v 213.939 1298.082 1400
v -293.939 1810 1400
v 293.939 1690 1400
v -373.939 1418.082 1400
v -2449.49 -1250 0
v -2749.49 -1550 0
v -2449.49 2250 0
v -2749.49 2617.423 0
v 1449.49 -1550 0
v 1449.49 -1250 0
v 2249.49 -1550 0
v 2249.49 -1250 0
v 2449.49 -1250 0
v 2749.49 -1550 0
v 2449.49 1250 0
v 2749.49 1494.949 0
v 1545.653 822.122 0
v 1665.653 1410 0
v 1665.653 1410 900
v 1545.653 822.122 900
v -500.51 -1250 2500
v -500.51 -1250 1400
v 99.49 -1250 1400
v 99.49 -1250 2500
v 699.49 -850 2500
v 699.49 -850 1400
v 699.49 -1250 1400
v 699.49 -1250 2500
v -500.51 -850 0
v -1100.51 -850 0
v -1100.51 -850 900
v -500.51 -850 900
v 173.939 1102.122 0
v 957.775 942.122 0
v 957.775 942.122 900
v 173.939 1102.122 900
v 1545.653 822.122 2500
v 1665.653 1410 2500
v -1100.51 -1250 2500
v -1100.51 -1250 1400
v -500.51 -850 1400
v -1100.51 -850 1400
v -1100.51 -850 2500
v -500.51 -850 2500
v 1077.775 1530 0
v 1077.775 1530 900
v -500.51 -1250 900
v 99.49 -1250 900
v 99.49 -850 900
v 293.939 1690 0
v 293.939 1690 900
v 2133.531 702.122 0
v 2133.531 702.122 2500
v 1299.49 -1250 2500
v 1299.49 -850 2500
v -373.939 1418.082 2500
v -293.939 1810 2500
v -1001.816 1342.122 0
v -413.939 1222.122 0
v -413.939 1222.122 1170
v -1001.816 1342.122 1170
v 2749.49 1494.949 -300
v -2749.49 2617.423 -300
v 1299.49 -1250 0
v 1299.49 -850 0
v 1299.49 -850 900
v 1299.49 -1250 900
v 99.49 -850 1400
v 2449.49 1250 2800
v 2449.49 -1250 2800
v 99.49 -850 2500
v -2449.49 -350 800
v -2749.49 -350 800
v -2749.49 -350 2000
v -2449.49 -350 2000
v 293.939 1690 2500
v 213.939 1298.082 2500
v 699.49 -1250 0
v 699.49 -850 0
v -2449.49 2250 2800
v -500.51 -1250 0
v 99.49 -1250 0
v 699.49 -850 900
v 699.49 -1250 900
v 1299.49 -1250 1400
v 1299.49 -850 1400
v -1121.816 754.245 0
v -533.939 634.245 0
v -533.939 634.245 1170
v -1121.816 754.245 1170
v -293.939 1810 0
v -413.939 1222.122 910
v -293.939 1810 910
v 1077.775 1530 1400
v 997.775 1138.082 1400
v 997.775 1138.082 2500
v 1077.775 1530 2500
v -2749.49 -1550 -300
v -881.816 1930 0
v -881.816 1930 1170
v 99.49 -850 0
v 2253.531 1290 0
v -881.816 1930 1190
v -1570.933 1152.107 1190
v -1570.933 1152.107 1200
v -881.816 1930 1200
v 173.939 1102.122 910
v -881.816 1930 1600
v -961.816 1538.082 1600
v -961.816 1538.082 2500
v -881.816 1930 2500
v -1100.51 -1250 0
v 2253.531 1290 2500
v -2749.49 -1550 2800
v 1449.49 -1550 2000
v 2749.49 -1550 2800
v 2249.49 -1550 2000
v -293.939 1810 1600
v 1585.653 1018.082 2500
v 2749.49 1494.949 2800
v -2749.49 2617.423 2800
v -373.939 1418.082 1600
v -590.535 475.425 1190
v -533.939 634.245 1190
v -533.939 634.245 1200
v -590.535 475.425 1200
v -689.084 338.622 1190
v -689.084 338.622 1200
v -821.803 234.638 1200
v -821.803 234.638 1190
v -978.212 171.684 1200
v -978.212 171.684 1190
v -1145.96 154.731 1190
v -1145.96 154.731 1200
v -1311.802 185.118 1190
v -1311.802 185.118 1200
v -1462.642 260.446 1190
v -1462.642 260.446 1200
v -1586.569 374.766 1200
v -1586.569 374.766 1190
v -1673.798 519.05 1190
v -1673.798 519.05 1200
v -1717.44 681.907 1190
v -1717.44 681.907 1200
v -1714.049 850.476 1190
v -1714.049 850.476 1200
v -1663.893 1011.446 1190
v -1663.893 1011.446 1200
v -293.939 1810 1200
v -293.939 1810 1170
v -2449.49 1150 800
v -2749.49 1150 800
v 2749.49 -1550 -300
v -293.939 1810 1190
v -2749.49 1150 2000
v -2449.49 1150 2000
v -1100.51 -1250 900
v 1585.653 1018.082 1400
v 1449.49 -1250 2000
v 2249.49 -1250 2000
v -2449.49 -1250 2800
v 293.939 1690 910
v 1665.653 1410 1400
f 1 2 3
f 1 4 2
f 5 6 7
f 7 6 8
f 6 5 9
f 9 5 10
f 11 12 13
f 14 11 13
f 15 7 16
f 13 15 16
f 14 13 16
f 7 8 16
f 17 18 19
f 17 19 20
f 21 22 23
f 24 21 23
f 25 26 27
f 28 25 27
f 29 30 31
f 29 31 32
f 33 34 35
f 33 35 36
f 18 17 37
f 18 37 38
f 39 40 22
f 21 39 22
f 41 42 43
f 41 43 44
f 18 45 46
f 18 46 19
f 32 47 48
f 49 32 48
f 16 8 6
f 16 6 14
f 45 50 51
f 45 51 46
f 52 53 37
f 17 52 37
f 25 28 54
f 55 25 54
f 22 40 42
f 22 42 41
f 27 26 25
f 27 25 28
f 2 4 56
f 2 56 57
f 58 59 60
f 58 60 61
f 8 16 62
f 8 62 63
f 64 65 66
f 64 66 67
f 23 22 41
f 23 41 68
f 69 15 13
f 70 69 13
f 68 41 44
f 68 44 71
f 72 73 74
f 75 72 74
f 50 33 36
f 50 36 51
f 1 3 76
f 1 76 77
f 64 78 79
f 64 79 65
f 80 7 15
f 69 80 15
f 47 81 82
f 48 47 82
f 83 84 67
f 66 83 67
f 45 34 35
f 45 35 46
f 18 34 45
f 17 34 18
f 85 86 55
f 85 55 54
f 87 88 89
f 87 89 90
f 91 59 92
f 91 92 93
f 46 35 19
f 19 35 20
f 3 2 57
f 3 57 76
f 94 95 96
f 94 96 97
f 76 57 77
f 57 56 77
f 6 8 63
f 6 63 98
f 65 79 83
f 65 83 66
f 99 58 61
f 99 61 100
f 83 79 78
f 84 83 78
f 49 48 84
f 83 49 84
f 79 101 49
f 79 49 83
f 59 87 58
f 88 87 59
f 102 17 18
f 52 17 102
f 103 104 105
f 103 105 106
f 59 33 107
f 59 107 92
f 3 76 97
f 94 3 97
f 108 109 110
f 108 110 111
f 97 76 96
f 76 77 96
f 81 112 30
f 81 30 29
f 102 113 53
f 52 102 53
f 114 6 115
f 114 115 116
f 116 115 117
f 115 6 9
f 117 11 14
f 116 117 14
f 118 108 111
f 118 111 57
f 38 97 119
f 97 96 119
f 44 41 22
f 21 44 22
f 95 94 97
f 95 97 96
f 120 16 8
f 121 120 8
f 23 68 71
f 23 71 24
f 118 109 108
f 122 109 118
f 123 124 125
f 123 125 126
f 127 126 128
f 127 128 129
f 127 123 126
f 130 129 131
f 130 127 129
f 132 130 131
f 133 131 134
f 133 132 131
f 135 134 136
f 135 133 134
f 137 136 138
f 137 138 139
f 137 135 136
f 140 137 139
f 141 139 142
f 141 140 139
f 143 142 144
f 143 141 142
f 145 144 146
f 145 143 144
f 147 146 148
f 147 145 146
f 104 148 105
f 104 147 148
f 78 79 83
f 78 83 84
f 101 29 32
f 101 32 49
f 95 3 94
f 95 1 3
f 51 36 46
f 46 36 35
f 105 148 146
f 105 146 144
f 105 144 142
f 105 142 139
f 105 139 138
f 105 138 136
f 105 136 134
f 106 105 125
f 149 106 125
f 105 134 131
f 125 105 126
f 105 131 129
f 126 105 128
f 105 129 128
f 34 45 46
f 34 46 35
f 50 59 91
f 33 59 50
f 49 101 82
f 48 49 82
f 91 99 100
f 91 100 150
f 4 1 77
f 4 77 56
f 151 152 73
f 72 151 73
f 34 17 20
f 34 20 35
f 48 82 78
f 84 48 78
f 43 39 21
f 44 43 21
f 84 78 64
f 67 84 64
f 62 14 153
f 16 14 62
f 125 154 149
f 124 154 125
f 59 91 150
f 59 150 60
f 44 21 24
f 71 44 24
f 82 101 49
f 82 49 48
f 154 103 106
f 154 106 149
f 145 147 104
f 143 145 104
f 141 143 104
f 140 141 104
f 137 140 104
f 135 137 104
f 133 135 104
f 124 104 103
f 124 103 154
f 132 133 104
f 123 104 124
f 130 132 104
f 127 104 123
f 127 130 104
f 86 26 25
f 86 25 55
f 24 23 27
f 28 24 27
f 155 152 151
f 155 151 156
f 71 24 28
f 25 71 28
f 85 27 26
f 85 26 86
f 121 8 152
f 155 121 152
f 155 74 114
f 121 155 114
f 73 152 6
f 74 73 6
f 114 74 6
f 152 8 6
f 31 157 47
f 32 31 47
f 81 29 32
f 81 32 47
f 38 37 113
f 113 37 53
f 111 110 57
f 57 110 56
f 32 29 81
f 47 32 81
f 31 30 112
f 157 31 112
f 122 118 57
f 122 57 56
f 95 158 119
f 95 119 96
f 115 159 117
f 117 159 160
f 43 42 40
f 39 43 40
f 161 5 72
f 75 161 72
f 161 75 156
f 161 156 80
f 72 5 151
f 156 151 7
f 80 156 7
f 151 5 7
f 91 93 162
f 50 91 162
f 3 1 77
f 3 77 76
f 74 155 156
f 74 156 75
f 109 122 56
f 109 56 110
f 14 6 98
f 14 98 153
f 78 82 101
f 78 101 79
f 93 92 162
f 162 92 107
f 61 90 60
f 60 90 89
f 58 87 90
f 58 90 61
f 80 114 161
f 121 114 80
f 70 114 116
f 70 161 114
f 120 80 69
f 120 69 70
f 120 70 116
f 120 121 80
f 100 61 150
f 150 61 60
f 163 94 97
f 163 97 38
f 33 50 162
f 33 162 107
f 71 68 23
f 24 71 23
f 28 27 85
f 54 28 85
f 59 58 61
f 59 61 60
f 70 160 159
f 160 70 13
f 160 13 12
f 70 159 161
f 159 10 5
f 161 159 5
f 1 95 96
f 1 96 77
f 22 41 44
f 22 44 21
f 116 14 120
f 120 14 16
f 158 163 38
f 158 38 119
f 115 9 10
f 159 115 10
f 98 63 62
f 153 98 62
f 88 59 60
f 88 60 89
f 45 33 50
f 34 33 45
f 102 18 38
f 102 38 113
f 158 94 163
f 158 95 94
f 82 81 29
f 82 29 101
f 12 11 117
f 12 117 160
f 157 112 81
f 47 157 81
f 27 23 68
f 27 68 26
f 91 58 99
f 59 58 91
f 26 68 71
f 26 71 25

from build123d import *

# Parameters (mm, degrees)
F0_W      = 300
F0_H      = 1500
F0_W_2    = 800
F0_H_2    = 300
F1_DEPTH  = 300
F2_DEPTH  = 2800
F3_DEPTH  = 2000
F4_W      = 1500
F4_H      = 1200
F5_DEPTH  = 300
F7_DEPTH  = 2500
F8_DEPTH  = 1170
F6_W      = 600
F6_H      = 400
F9_DEPTH  = 900
F10_DEPTH = 900
F11_DEPTH = 900
F12_DEPTH = 900
F13_START = -1400
F13_DEPTH = 1100
F14_START = -1400
F14_DEPTH = 1100
F15_START = -1400
F15_DEPTH = 1100
F16_START = -1400
F16_DEPTH = 1100
F17_DEPTH = 900
F18_DEPTH = 900
F19_DEPTH = 910
F20_DEPTH = 1170
F21_START = -1190
F21_DEPTH = 10
F22_START = -1400
F22_DEPTH = 1100
F23_START = -1400
F23_DEPTH = 1100
F24_START = -1400
F24_DEPTH = 1100
F25_START = -1600
F25_DEPTH = 900


with BuildPart() as f1:
    # F0 (on Top) → F1 (new body)
    with BuildSketch(Plane.XY):
        with Locations((-2599.4897427832, 500)):
            Rectangle(F0_W, F0_H)
        Polygon((-2449.4897427832, -250), (-2449.4897427832, -1250), (1449.4897427832, -1250), (2249.4897427832, -1250), (2449.4897427832, -1250), (2449.4897427832, 1250), (-2449.4897427832, 2250), (-2449.4897427832, 1250), align=None)
        Polygon((2449.4897427832, -1250), (2249.4897427832, -1250), (2249.4897427832, -1550), (2749.4897427832, -1550), (2749.4897427832, 1494.9489742783), (-2749.4897427832, 2617.4234614175), (-2749.4897427832, 1250), (-2449.4897427832, 1250), (-2449.4897427832, 2250), (2449.4897427832, 1250), align=None)
        with Locations((1849.4897427832, -1400)):
            Rectangle(F0_W_2, F0_H_2)
        Polygon((1449.4897427832, -1250), (-2449.4897427832, -1250), (-2449.4897427832, -250), (-2749.4897427832, -250), (-2749.4897427832, -1550), (1449.4897427832, -1550), align=None)
    extrude(amount=-F1_DEPTH)


with BuildPart() as f2:
    # F0 (on Top) → F2 (new body)
    with BuildSketch(Plane.XY):
        Polygon((1449.4897427832, -1250), (-2449.4897427832, -1250), (-2449.4897427832, -250), (-2749.4897427832, -250), (-2749.4897427832, -1550), (1449.4897427832, -1550), align=None)
        with Locations((-2599.4897427832, 500)):
            Rectangle(F0_W, F0_H)
        Polygon((2449.4897427832, -1250), (2249.4897427832, -1250), (2249.4897427832, -1550), (2749.4897427832, -1550), (2749.4897427832, 1494.9489742783), (-2749.4897427832, 2617.4234614175), (-2749.4897427832, 1250), (-2449.4897427832, 1250), (-2449.4897427832, 2250), (2449.4897427832, 1250), align=None)
        with Locations((1849.4897427832, -1400)):
            Rectangle(F0_W_2, F0_H_2)
    extrude(amount=F2_DEPTH)

    # F0 (on Top) → F3 (cut)
    with BuildSketch(Plane.XY):
        with Locations((1849.4897427832, -1400)):
            Rectangle(F0_W_2, F0_H_2)
    extrude(amount=F3_DEPTH, mode=Mode.SUBTRACT)

    # F4 (on face) → F5 (cut, through all)
    with BuildSketch(Plane(origin=(-2749.4897427832, 0, 0), x_dir=(0, -1, 0), z_dir=(-1, 0, 0))):
        with Locations((-400, 1400)):
            Rectangle(F4_W, F4_H)
    extrude(amount=-F5_DEPTH, mode=Mode.SUBTRACT)


with BuildPart() as f7:
    # F6 (on face) → F7 (new body)
    with BuildSketch(Plane(origin=(0, 0, 0), x_dir=(1, 0, 0), z_dir=(0, 0, -1))):
        Polygon((1665.6530250926, -1410), (2253.5305633605, -1290), (2173.5305633605, -898.0816411547), (1585.6530250926, -1018.0816411547), align=None)
        Polygon((1585.6530250926, -1018.0816411547), (2173.5305633605, -898.0816411547), (2133.5305633605, -702.122461732), (1545.6530250926, -822.122461732), align=None)
    extrude(amount=-F7_DEPTH)


with BuildPart() as f8:
    # F6 (on face) → F8 (new body)
    with BuildSketch(Plane(origin=(0, 0, 0), x_dir=(1, 0, 0), z_dir=(0, 0, -1))):
        with BuildLine():
            Line((-1121.8163074019, -754.2449234641), (-1001.8163074019, -1342.122461732))
            ThreePointArc((-1001.8163074019, -1342.122461732), (-657.0583058571, -1133.7182426843), (-521.8163074019, -754.2449234641))
            ThreePointArc((-521.8163074019, -754.2449234641), (-524.8546155989, -693.939546261), (-533.938769134, -634.2449234641))
            Line((-533.938769134, -634.2449234641), (-1121.8163074019, -754.2449234641))
        make_face()
        with BuildLine():
            Line((-1001.8163074019, -1342.122461732), (-413.938769134, -1222.122461732))
            Line((-413.938769134, -1222.122461732), (-533.938769134, -634.2449234641))
            ThreePointArc((-533.938769134, -634.2449234641), (-524.8546155989, -693.939546261), (-521.8163074019, -754.2449234641))
            ThreePointArc((-521.8163074019, -754.2449234641), (-657.0583058571, -1133.7182426843), (-1001.8163074019, -1342.122461732))
        make_face()
    extrude(amount=-F8_DEPTH)


with BuildPart() as f9:
    # F6 (on face) → F9 (new body)
    with BuildSketch(Plane(origin=(0, 0, 0), x_dir=(1, 0, 0), z_dir=(0, 0, -1))):
        with Locations((999.4897427832, 1050)):
            Rectangle(F6_W, F6_H)
    extrude(amount=-F9_DEPTH)


with BuildPart() as f10:
    # F6 (on face) → F10 (new body)
    with BuildSketch(Plane(origin=(0, 0, 0), x_dir=(1, 0, 0), z_dir=(0, 0, -1))):
        with Locations((399.4897427832, 1050)):
            Rectangle(F6_W, F6_H)
    extrude(amount=-F10_DEPTH)


with BuildPart() as f11:
    # F6 (on face) → F11 (new body)
    with BuildSketch(Plane(origin=(0, 0, 0), x_dir=(1, 0, 0), z_dir=(0, 0, -1))):
        with Locations((-200.5102572168, 1050)):
            Rectangle(F6_W, F6_H)
    extrude(amount=-F11_DEPTH)


with BuildPart() as f12:
    # F6 (on face) → F12 (new body)
    with BuildSketch(Plane(origin=(0, 0, 0), x_dir=(1, 0, 0), z_dir=(0, 0, -1))):
        with Locations((-800.5102572168, 1050)):
            Rectangle(F6_W, F6_H)
    extrude(amount=-F12_DEPTH)


with BuildPart() as f13:
    # F6 (on face) → F13 (new body)
    with BuildSketch(Plane(origin=(0, 0, 0), x_dir=(1, 0, 0), z_dir=(0, 0, -1)).offset(F13_START)):
        with Locations((999.4897427832, 1050)):
            Rectangle(F6_W, F6_H)
    extrude(amount=-F13_DEPTH)


with BuildPart() as f14:
    # F6 (on face) → F14 (new body)
    with BuildSketch(Plane(origin=(0, 0, 0), x_dir=(1, 0, 0), z_dir=(0, 0, -1)).offset(F14_START)):
        with Locations((399.4897427832, 1050)):
            Rectangle(F6_W, F6_H)
    extrude(amount=-F14_DEPTH)


with BuildPart() as f15:
    # F6 (on face) → F15 (new body)
    with BuildSketch(Plane(origin=(0, 0, 0), x_dir=(1, 0, 0), z_dir=(0, 0, -1)).offset(F15_START)):
        with Locations((-200.5102572168, 1050)):
            Rectangle(F6_W, F6_H)
    extrude(amount=-F15_DEPTH)


with BuildPart() as f16:
    # F6 (on face) → F16 (new body)
    with BuildSketch(Plane(origin=(0, 0, 0), x_dir=(1, 0, 0), z_dir=(0, 0, -1)).offset(F16_START)):
        with Locations((-800.5102572168, 1050)):
            Rectangle(F6_W, F6_H)
    extrude(amount=-F16_DEPTH)


with BuildPart() as f17:
    # F6 (on face) → F17 (new body)
    with BuildSketch(Plane(origin=(0, 0, 0), x_dir=(1, 0, 0), z_dir=(0, 0, -1))):
        Polygon((997.7754868246, -1138.0816411547), (1585.6530250926, -1018.0816411547), (1545.6530250926, -822.122461732), (957.7754868246, -942.122461732), align=None)
        Polygon((1077.7754868246, -1530), (1665.6530250926, -1410), (1585.6530250926, -1018.0816411547), (997.7754868246, -1138.0816411547), align=None)
    extrude(amount=-F17_DEPTH)


with BuildPart() as f18:
    # F6 (on face) → F18 (new body)
    with BuildSketch(Plane(origin=(0, 0, 0), x_dir=(1, 0, 0), z_dir=(0, 0, -1))):
        Polygon((293.938769134, -1690), (1077.7754868246, -1530), (997.7754868246, -1138.0816411547), (213.938769134, -1298.0816411547), align=None)
        Polygon((213.938769134, -1298.0816411547), (997.7754868246, -1138.0816411547), (957.7754868246, -942.122461732), (173.938769134, -1102.122461732), align=None)
    extrude(amount=-F18_DEPTH)


with BuildPart() as f19:
    # F6 (on face) → F19 (new body)
    with BuildSketch(Plane(origin=(0, 0, 0), x_dir=(1, 0, 0), z_dir=(0, 0, -1))):
        Polygon((-293.938769134, -1810), (293.938769134, -1690), (213.938769134, -1298.0816411547), (-373.938769134, -1418.0816411547), align=None)
        Polygon((-373.938769134, -1418.0816411547), (213.938769134, -1298.0816411547), (173.938769134, -1102.122461732), (-413.938769134, -1222.122461732), align=None)
    extrude(amount=-F19_DEPTH)


with BuildPart() as f20:
    # F6 (on face) → F20 (new body, through all)
    with BuildSketch(Plane(origin=(0, 0, 0), x_dir=(1, 0, 0), z_dir=(0, 0, -1))):
        Polygon((-881.8163074019, -1930), (-293.938769134, -1810), (-373.938769134, -1418.0816411547), (-961.8163074019, -1538.0816411547), align=None)
        Polygon((-961.8163074019, -1538.0816411547), (-373.938769134, -1418.0816411547), (-413.938769134, -1222.122461732), (-1001.8163074019, -1342.122461732), align=None)
    extrude(amount=-F20_DEPTH)


with BuildPart() as f21:
    # F6 (on face) → F21 (new body)
    with BuildSketch(Plane(origin=(0, 0, 0), x_dir=(1, 0, 0), z_dir=(0, 0, -1)).offset(F21_START)):
        with BuildLine():
            ThreePointArc((-1570.9331898563, -1152.1067410522), (-1311.8320280818, -1323.3618059184), (-1001.8163074019, -1342.122461732))
            Line((-1001.8163074019, -1342.122461732), (-1121.8163074019, -754.2449234641))
            Line((-1121.8163074019, -754.2449234641), (-533.938769134, -634.2449234641))
            ThreePointArc((-533.938769134, -634.2449234641), (-1389.8813096484, -217.4571119681), (-1570.9331898563, -1152.1067410522))
        make_face()
        with BuildLine():
            Line((-1121.8163074019, -754.2449234641), (-1001.8163074019, -1342.122461732))
            ThreePointArc((-1001.8163074019, -1342.122461732), (-657.0583058571, -1133.7182426843), (-521.8163074019, -754.2449234641))
            ThreePointArc((-521.8163074019, -754.2449234641), (-524.8546155989, -693.939546261), (-533.938769134, -634.2449234641))
            Line((-533.938769134, -634.2449234641), (-1121.8163074019, -754.2449234641))
        make_face()
        with BuildLine():
            Line((-1001.8163074019, -1342.122461732), (-413.938769134, -1222.122461732))
            Line((-413.938769134, -1222.122461732), (-533.938769134, -634.2449234641))
            ThreePointArc((-533.938769134, -634.2449234641), (-524.8546155989, -693.939546261), (-521.8163074019, -754.2449234641))
            ThreePointArc((-521.8163074019, -754.2449234641), (-657.0583058571, -1133.7182426843), (-1001.8163074019, -1342.122461732))
        make_face()
        Polygon((-961.8163074019, -1538.0816411547), (-373.938769134, -1418.0816411547), (-413.938769134, -1222.122461732), (-1001.8163074019, -1342.122461732), align=None)
        Polygon((-881.8163074019, -1930), (-293.938769134, -1810), (-373.938769134, -1418.0816411547), (-961.8163074019, -1538.0816411547), align=None)
        with BuildLine():
            Line((-1188.0904773816, -1584.2696626899), (-961.8163074019, -1538.0816411547))
            Line((-961.8163074019, -1538.0816411547), (-1001.8163074019, -1342.122461732))
            ThreePointArc((-1001.8163074019, -1342.122461732), (-1311.8320280818, -1323.3618059184), (-1570.9331898563, -1152.1067410522))
            Line((-1570.9331898563, -1152.1067410522), (-1188.0904773816, -1584.2696626899))
        make_face()
        Polygon((-1188.0904773816, -1584.2696626899), (-881.8163074019, -1930), (-961.8163074019, -1538.0816411547), align=None)
    extrude(amount=-F21_DEPTH)


with BuildPart() as f22:
    # F6 (on face) → F22 (new body)
    with BuildSketch(Plane(origin=(0, 0, 0), x_dir=(1, 0, 0), z_dir=(0, 0, -1)).offset(F22_START)):
        Polygon((1077.7754868246, -1530), (1665.6530250926, -1410), (1585.6530250926, -1018.0816411547), (997.7754868246, -1138.0816411547), align=None)
    extrude(amount=-F22_DEPTH)


with BuildPart() as f23:
    # F6 (on face) → F23 (new body)
    with BuildSketch(Plane(origin=(0, 0, 0), x_dir=(1, 0, 0), z_dir=(0, 0, -1)).offset(F23_START)):
        Polygon((293.938769134, -1690), (1077.7754868246, -1530), (997.7754868246, -1138.0816411547), (213.938769134, -1298.0816411547), align=None)
    extrude(amount=-F23_DEPTH)


with BuildPart() as f24:
    # F6 (on face) → F24 (new body)
    with BuildSketch(Plane(origin=(0, 0, 0), x_dir=(1, 0, 0), z_dir=(0, 0, -1)).offset(F24_START)):
        Polygon((-293.938769134, -1810), (293.938769134, -1690), (213.938769134, -1298.0816411547), (-373.938769134, -1418.0816411547), align=None)
    extrude(amount=-F24_DEPTH)


with BuildPart() as f25:
    # F6 (on face) → F25 (new body)
    with BuildSketch(Plane(origin=(0, 0, 0), x_dir=(1, 0, 0), z_dir=(0, 0, -1)).offset(F25_START)):
        Polygon((-881.8163074019, -1930), (-293.938769134, -1810), (-373.938769134, -1418.0816411547), (-961.8163074019, -1538.0816411547), align=None)
    extrude(amount=-F25_DEPTH)


solid = Compound([f1.part, f2.part, f7.part, f8.part, f9.part, f10.part, f11.part, f12.part, f13.part, f14.part, f15.part, f16.part, f17.part, f18.part, f19.part, f20.part, f21.part, f22.part, f23.part, f24.part, f25.part])
